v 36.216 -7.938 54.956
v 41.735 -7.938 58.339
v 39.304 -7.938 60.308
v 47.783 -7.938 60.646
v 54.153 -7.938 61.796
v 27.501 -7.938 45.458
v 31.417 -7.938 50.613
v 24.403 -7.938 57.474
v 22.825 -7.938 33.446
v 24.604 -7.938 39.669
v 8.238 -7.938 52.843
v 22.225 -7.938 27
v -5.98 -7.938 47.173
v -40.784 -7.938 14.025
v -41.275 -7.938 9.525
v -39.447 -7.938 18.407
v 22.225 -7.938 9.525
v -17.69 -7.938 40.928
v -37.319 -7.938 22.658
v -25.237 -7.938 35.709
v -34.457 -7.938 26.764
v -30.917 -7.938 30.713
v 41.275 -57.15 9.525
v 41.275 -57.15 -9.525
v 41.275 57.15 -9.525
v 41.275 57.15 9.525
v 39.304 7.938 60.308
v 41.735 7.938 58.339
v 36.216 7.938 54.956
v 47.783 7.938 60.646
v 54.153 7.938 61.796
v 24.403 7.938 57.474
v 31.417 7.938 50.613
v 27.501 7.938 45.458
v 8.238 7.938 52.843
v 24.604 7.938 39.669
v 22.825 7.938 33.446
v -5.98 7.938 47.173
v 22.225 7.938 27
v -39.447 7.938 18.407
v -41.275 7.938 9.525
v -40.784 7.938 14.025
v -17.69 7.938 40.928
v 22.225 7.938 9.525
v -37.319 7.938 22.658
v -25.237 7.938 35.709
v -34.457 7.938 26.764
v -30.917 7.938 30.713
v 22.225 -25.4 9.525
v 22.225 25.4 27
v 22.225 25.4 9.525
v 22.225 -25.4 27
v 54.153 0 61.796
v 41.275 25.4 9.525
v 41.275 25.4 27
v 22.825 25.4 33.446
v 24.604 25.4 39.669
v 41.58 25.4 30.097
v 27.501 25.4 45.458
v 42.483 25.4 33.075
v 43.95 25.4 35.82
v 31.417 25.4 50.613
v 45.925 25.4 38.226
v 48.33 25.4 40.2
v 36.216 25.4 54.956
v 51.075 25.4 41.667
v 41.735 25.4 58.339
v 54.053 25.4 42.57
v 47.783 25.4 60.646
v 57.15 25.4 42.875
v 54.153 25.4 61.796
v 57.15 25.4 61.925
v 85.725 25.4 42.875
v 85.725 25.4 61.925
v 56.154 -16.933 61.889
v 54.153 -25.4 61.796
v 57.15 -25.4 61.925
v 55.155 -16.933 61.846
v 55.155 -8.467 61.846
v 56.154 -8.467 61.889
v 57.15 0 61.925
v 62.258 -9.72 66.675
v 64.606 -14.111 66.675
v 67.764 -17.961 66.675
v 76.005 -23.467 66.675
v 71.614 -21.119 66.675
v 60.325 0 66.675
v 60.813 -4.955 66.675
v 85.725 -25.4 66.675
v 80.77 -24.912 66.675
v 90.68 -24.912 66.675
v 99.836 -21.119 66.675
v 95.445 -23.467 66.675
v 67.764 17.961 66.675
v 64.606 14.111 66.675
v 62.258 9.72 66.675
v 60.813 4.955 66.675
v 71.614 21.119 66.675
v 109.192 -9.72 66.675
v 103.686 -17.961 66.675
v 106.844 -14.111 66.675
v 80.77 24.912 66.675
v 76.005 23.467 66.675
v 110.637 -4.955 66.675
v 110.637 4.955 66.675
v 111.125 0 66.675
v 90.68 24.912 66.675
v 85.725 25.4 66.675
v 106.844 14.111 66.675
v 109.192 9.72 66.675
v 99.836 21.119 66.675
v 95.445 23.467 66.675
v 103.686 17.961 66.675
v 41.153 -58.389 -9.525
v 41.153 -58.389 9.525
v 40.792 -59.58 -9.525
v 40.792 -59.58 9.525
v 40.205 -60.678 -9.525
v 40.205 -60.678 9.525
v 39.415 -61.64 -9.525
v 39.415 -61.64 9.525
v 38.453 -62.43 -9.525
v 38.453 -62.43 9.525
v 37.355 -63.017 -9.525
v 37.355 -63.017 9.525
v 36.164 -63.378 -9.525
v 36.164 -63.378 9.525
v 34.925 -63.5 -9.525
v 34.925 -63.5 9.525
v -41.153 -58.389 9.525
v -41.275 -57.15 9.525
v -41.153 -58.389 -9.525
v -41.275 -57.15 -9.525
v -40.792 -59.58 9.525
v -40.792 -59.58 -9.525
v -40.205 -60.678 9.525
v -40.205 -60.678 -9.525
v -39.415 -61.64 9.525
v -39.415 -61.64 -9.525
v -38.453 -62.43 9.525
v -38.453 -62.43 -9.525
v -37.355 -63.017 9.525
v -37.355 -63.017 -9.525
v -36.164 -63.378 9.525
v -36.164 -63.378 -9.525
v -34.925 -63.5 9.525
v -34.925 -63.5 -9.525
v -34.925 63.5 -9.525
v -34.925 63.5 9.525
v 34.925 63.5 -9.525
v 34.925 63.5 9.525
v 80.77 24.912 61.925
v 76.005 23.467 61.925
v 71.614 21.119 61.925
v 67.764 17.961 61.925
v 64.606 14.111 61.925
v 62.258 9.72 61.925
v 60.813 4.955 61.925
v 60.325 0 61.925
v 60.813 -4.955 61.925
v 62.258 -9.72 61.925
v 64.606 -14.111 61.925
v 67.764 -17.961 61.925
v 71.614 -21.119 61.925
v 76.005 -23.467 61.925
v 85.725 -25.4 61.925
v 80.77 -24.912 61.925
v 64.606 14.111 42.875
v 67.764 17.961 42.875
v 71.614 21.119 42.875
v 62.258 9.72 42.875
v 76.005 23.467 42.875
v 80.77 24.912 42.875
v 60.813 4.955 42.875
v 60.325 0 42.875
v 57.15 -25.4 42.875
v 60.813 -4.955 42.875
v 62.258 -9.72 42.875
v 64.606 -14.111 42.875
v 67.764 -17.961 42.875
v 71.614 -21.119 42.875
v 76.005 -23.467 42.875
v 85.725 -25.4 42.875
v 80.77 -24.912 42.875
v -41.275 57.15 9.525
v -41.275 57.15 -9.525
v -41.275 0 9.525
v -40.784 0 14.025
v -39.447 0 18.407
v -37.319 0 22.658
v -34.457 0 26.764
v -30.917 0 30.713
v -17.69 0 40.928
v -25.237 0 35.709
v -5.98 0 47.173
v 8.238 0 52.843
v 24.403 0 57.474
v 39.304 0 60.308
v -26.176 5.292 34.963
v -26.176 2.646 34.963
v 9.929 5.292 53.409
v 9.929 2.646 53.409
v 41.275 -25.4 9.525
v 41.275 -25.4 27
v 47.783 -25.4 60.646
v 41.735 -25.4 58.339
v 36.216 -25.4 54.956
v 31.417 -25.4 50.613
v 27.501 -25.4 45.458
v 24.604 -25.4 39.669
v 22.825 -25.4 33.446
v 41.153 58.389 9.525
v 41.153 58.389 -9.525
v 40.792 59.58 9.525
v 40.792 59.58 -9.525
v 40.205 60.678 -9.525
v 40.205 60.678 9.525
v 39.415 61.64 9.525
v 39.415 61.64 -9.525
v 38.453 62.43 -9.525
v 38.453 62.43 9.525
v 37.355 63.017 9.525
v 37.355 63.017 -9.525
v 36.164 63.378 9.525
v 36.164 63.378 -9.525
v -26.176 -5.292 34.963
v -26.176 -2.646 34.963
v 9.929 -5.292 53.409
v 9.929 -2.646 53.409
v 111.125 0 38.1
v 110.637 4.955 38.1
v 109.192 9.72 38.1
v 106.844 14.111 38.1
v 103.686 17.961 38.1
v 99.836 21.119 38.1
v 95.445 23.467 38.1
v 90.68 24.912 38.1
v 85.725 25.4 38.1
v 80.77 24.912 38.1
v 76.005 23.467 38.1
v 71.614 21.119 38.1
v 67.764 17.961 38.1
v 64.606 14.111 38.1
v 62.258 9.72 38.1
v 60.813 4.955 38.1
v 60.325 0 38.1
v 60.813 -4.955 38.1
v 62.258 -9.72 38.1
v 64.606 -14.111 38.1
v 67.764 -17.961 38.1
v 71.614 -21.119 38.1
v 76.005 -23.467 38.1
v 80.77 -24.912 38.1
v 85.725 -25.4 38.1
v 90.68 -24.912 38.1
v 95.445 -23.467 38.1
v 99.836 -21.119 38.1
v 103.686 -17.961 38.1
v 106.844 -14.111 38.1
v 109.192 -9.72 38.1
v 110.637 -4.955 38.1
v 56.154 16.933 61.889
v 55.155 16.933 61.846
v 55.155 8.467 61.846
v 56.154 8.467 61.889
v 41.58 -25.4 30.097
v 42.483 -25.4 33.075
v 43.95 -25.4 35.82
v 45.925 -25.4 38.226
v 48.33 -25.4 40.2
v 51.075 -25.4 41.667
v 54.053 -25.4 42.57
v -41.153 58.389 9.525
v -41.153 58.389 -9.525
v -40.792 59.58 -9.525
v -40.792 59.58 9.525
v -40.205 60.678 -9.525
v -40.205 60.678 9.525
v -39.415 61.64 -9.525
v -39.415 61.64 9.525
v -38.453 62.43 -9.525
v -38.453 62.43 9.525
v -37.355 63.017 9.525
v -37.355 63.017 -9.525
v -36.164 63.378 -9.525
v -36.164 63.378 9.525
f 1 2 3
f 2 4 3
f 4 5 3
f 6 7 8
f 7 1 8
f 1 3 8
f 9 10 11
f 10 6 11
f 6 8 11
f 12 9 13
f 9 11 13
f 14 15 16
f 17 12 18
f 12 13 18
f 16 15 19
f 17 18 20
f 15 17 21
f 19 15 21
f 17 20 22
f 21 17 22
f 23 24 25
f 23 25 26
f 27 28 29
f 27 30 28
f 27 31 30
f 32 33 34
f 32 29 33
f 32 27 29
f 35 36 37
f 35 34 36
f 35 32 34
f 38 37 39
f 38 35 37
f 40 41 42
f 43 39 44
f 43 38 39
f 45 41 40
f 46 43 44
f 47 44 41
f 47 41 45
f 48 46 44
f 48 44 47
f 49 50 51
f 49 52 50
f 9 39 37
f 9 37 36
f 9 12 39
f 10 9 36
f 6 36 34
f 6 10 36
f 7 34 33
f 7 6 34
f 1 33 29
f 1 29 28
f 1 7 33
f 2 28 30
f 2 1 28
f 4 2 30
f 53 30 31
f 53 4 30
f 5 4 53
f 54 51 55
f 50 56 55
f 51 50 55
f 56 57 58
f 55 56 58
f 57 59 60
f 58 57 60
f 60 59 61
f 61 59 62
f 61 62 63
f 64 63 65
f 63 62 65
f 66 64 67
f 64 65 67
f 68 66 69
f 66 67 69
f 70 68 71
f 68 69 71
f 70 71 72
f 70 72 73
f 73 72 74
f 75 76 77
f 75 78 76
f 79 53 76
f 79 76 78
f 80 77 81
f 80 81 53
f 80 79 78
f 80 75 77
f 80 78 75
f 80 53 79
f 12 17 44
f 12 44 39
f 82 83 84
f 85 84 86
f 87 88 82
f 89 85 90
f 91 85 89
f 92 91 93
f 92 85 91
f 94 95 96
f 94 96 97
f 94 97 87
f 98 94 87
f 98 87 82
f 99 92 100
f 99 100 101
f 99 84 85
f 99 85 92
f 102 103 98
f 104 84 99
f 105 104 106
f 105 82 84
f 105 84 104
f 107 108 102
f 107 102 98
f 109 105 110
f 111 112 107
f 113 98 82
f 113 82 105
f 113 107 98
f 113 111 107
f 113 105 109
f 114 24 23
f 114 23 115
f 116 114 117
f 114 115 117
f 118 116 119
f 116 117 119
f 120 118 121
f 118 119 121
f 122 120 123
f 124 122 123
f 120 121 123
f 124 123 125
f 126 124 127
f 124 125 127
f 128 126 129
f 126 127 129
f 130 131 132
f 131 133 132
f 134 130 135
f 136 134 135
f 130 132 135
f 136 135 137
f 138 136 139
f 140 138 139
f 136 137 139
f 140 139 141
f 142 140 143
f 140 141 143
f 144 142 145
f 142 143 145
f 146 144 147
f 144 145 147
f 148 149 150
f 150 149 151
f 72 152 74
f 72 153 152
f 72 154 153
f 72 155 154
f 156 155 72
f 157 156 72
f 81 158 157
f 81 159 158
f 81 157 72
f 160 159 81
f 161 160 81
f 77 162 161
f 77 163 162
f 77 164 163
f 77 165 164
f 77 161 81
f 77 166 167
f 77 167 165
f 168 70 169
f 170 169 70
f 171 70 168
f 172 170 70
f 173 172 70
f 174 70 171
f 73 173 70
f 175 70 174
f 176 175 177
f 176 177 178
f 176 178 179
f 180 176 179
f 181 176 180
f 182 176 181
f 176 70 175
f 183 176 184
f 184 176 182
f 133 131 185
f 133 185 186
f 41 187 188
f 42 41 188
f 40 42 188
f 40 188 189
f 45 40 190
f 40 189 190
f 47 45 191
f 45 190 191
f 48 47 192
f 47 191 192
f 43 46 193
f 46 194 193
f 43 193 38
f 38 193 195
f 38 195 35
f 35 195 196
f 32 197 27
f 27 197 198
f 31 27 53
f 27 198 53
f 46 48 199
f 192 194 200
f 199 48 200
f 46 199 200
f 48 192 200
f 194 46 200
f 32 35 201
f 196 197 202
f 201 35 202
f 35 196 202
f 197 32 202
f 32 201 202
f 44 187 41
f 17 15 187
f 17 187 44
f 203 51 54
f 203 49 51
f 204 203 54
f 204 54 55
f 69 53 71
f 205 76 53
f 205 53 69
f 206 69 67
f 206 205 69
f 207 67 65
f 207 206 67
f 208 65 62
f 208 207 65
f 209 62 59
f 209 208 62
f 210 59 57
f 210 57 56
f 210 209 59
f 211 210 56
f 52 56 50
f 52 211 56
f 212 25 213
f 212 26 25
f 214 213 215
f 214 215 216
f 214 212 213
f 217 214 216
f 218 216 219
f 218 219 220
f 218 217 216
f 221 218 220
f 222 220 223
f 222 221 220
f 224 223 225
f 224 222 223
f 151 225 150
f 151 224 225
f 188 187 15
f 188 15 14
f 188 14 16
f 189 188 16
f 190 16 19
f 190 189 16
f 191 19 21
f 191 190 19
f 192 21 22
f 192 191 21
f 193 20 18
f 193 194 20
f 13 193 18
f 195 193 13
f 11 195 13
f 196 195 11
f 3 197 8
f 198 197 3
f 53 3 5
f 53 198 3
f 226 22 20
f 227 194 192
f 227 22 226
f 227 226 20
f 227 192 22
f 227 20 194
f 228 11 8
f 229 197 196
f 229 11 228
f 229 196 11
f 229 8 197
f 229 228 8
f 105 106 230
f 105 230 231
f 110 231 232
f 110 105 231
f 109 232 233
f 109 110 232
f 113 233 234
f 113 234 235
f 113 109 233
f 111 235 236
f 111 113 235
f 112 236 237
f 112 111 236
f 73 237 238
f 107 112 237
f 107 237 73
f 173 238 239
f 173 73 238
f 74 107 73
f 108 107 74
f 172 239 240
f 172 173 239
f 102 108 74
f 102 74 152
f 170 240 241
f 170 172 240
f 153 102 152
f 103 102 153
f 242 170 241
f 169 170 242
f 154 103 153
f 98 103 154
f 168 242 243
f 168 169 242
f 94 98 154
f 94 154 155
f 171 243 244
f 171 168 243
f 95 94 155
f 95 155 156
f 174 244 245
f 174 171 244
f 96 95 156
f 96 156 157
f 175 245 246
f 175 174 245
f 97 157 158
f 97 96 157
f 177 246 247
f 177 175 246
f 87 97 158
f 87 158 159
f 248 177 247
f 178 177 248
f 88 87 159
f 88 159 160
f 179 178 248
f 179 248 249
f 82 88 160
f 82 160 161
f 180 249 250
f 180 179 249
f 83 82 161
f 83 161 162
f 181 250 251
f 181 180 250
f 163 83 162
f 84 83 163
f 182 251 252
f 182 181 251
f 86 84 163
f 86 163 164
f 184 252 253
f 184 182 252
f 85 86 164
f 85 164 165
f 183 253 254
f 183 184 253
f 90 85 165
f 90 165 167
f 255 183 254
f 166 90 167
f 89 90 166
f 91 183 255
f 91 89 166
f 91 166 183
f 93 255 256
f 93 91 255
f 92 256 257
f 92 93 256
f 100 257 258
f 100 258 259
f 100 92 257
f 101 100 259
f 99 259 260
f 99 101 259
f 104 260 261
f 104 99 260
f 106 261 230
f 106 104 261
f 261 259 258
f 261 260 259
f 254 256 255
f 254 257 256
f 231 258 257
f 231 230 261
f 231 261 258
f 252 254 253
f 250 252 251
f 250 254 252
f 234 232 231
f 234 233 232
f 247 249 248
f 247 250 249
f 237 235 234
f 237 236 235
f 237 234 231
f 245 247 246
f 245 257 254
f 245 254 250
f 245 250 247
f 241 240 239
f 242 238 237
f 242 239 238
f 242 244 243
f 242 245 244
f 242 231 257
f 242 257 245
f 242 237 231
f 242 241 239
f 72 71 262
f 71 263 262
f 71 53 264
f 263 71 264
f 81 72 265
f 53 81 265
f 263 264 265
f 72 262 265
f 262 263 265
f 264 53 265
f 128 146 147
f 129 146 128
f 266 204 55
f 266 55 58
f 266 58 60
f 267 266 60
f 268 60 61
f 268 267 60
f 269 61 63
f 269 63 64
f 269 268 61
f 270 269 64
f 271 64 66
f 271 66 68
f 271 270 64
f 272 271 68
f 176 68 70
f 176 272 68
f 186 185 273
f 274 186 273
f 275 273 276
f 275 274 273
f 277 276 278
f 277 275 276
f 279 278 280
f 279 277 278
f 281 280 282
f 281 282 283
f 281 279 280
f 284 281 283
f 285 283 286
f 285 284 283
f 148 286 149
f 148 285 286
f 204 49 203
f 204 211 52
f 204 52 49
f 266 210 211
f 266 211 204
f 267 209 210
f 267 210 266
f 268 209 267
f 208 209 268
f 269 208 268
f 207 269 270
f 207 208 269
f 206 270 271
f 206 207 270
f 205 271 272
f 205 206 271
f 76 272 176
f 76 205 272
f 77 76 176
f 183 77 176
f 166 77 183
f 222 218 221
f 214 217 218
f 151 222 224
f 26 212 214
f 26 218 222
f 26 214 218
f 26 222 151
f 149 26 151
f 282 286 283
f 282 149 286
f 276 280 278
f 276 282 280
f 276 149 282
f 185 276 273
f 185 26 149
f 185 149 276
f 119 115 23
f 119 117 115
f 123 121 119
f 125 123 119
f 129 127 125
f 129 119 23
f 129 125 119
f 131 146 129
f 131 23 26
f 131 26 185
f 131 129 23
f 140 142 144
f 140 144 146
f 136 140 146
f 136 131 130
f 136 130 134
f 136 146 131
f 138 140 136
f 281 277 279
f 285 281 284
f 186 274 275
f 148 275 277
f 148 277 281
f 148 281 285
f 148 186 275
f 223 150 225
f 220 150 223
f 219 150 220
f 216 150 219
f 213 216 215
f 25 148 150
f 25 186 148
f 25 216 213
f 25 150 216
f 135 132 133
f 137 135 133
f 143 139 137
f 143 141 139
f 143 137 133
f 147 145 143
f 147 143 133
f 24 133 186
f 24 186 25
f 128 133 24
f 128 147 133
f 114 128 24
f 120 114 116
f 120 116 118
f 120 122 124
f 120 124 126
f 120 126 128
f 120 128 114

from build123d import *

# Parameters (mm, degrees)
F1_DEPTH = 63.5
F0_W     = 25.4
F0_H     = 19.05
F2_DEPTH = 25.4
F3_DEPTH = 7.9375
F5_R     = 6.35


with BuildPart() as f1:
    # F0 (on Front) → F1 (new body, symmetric)
    with BuildSketch(Plane.XZ):
        Polygon((-41.275, 9.525), (-41.275, -9.525), (41.275, -9.525), (41.275, 9.525), (22.225, 9.525), align=None)
    extrude(amount=F1_DEPTH, both=True)

    # F5
    f5_edges = [f1.edges().sort_by_distance(p)[0] for p in [
        (41.275, -63.5, 0),
        (41.275, 63.5, 0),
        (-41.275, 63.5, 0),
        (-41.275, -63.5, 0),
    ]]
    fillet(f5_edges, radius=F5_R)


with BuildPart() as f2:
    # F0 (on Front) → F2 (new body, symmetric)
    with BuildSketch(Plane.XZ):
        with BuildLine():
            Line((22.225, 9.525), (41.275, 9.525))
            Line((41.275, 9.525), (41.275, 27.0002))
            ThreePointArc((41.275, 27.0002), (45.9246798487, 38.2255201513), (57.15, 42.8752))
            Line((57.15, 42.8752), (60.325, 42.8752))
            Line((60.325, 42.8752), (60.325, 61.9252))
            Line((60.325, 61.9252), (57.15, 61.9252))
            add(Edge.make_bspline(
                [(54.1534553812, 61.7964116522), (55.1562490724, 61.8496292221), (56.1553262898, 61.8926131979), (57.15, 61.9252)],
                knots=[109.019265186, 109.019265186, 109.019265186, 109.019265186, 111.5045361635, 111.5045361635, 111.5045361635, 111.5045361635], degree=3))
            ThreePointArc((54.1534553812, 61.7964116522), (31.4166563986, 50.6127104996), (22.225, 27.0002))
            Line((22.225, 27.0002), (22.225, 9.525))
        make_face()
        with Locations((73.025, 52.4002)):
            Rectangle(F0_W, F0_H)
    extrude(amount=F2_DEPTH, both=True)

    # F0 (on Front) → F4 (revolve)
    with BuildSketch(Plane.XZ):
        Polygon((85.725, 66.675), (85.725, 61.9252), (85.725, 42.8752), (85.725, 38.1), (111.125, 38.1), (111.125, 66.675), align=None)
    revolve(axis=Axis((85.725, 0, 52.3875), (0, 0, 1)))


with BuildPart() as f3:
    # F0 (on Front) → F3 (new body, symmetric)
    with BuildSketch(Plane.XZ):
        with BuildLine():
            add(Edge.make_bspline(
                [(-41.275, 9.525), (-40.9753215909, 37.4356315417), (10.1647586431, 59.4619618421), (54.1534553812, 61.7964116522)],
                knots=[0, 0, 0, 0, 109.019265186, 109.019265186, 109.019265186, 109.019265186], degree=3))
            Line((-41.275, 9.525), (22.225, 9.525))
            Line((22.225, 9.525), (22.225, 27.0002))
            ThreePointArc((22.225, 27.0002), (31.4166563986, 50.6127104996), (54.1534553812, 61.7964116522))
        make_face()
    extrude(amount=F3_DEPTH, both=True)


solid = Compound([f1.part, f2.part, f3.part])
